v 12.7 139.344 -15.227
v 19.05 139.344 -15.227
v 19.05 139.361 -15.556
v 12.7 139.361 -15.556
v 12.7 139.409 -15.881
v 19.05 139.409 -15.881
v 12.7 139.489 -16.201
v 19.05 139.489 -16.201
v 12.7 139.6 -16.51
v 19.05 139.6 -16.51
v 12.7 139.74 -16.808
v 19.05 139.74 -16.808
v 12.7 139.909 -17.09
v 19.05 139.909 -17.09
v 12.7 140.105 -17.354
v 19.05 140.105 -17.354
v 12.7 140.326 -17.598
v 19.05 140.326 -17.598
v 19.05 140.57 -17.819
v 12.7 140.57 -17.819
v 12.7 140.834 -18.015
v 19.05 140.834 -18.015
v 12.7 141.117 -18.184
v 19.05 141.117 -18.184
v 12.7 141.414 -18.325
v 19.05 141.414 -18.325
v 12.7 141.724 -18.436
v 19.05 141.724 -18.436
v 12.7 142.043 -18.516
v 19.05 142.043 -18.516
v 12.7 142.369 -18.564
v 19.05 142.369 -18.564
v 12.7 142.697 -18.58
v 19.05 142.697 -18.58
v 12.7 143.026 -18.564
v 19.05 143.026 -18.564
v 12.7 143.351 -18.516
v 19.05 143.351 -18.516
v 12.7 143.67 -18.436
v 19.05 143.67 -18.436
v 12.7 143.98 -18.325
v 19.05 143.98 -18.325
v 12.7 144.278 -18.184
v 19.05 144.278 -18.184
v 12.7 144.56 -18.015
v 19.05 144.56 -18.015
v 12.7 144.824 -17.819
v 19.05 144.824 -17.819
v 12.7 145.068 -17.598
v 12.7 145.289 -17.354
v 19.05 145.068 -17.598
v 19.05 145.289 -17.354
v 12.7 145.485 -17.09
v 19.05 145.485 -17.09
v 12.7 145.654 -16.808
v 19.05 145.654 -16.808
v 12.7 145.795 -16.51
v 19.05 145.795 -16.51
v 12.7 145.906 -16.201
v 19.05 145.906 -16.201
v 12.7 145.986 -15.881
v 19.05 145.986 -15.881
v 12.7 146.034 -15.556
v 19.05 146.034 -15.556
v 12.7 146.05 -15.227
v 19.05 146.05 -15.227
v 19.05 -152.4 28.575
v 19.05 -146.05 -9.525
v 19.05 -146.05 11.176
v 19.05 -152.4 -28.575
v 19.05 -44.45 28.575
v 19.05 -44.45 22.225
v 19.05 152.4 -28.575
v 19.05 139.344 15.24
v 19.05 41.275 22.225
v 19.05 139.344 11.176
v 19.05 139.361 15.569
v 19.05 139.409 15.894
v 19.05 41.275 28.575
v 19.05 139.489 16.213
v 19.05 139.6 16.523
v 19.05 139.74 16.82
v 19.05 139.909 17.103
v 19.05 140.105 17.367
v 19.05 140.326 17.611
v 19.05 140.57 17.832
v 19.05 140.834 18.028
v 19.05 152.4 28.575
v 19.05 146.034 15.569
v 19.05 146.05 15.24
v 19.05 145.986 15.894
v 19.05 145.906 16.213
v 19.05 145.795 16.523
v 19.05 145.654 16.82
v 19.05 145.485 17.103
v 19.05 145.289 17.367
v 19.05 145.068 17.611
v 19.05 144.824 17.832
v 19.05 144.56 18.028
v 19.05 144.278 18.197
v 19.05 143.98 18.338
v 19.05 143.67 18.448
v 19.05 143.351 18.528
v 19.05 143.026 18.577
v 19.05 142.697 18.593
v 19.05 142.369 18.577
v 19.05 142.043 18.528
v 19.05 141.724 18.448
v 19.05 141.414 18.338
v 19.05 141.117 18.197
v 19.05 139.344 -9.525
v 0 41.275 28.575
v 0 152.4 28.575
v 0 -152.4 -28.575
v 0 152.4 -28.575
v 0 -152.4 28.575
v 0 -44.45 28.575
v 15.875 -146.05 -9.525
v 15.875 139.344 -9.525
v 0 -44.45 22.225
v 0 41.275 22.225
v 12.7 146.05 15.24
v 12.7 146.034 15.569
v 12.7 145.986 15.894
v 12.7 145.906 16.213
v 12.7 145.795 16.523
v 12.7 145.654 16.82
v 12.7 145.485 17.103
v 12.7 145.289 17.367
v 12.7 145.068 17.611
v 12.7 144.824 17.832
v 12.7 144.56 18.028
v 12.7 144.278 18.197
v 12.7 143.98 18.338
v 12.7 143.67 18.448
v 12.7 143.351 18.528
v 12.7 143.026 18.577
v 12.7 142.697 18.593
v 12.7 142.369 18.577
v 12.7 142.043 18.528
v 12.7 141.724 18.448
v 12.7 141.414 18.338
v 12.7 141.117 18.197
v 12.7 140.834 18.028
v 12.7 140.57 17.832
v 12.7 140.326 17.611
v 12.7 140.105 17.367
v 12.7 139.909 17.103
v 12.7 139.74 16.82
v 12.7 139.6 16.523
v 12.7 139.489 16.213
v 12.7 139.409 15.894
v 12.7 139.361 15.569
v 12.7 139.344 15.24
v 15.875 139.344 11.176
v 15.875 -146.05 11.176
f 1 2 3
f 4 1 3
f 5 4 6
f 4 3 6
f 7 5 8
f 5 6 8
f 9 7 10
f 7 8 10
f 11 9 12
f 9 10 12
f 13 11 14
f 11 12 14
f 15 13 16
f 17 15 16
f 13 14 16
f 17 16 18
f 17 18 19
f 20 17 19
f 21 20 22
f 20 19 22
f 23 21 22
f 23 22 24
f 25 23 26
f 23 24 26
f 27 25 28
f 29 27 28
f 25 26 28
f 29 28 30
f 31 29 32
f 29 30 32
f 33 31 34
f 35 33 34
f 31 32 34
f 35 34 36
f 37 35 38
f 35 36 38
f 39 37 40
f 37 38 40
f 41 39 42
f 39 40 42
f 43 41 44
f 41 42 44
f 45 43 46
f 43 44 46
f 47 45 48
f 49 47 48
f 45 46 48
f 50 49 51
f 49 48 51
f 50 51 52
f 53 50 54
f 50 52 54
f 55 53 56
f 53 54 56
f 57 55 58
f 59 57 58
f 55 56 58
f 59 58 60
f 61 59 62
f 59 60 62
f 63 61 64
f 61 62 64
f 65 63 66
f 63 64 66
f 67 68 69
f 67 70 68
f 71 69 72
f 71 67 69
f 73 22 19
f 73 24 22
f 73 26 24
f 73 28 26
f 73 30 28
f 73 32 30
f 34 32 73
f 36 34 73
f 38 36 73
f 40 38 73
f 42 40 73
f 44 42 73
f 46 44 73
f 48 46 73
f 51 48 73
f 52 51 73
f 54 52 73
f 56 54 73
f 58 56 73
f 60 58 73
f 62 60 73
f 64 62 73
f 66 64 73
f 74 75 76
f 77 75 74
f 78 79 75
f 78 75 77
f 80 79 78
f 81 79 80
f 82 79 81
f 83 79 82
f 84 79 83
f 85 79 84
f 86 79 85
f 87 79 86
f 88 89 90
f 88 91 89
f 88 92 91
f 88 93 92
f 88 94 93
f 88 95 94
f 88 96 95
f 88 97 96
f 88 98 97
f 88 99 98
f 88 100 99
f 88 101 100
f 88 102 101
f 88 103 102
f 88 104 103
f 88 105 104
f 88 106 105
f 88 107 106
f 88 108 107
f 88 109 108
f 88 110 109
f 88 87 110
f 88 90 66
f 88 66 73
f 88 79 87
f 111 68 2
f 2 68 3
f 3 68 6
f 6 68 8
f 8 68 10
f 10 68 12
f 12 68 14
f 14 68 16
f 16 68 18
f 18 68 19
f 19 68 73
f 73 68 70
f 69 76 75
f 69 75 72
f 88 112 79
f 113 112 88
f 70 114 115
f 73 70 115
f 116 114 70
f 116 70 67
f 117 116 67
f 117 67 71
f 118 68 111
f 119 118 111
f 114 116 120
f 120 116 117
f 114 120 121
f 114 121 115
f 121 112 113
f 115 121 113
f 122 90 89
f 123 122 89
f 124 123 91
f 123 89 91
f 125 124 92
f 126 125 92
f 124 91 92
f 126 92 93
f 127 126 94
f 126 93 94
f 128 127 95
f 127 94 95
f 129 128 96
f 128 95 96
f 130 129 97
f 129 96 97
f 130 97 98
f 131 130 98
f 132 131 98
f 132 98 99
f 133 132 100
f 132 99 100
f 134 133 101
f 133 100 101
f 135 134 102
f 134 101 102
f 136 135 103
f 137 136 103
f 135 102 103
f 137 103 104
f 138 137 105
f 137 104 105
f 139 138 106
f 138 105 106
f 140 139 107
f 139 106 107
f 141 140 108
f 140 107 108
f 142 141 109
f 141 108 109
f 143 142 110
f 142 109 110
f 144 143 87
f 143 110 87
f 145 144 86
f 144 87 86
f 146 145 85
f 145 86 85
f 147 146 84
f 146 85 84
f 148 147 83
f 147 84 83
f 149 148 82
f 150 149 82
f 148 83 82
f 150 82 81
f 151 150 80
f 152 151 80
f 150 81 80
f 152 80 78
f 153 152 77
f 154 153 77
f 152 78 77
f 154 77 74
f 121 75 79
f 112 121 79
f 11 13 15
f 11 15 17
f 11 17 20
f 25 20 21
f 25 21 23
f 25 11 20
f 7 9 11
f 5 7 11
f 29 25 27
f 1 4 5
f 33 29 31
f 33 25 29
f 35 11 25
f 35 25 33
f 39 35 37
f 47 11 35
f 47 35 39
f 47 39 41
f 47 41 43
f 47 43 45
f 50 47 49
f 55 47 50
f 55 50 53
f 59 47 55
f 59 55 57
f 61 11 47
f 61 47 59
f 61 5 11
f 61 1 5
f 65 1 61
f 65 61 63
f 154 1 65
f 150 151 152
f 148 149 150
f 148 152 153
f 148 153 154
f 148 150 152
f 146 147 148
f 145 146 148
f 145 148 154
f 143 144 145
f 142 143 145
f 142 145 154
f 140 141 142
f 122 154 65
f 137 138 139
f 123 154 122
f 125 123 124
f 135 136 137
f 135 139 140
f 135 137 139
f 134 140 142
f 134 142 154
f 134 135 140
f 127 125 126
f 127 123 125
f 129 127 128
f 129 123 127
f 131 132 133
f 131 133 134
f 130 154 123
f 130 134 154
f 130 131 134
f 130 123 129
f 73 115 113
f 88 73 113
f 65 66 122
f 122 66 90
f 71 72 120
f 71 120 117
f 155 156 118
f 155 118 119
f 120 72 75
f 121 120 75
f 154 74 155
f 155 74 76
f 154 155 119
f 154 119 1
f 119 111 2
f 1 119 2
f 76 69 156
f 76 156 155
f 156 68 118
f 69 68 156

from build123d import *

# Parameters (mm, degrees)
F0_W     = 304.8
F0_H     = 57.15
F1_DEPTH = 19.05
F3_DEPTH = 6.35
F4_W     = 285.3944
F4_H     = 20.701
F5_DEPTH = 3.175
F6_W     = 85.725
F6_H     = 6.35
F7_DEPTH = 19.05


with BuildPart() as f1:
    # F0 (on Right) → F1 (new body)
    with BuildSketch(Plane.YZ):
        Rectangle(F0_W, F0_H)
    extrude(amount=F1_DEPTH)

    # F2 (on face) → F3 (cut)
    with BuildSketch(Plane.YZ.offset(19.05)):
        with BuildLine():
            ThreePointArc((146.05, 15.24), (142.6972, 18.5928), (139.3444, 15.24))
            Line((139.3444, 15.24), (139.3444, -15.2273))
            ThreePointArc((139.3444, -15.2273), (142.6972, -18.5801), (146.05, -15.2273))
            Line((146.05, -15.2273), (146.05, 15.24))
        make_face()
    extrude(amount=-F3_DEPTH, mode=Mode.SUBTRACT)

    # F4 (on face) → F5 (cut)
    with BuildSketch(Plane.YZ.offset(19.05)):
        with Locations((-3.3528, 0.8255)):
            Rectangle(F4_W, F4_H)
    extrude(amount=-F5_DEPTH, mode=Mode.SUBTRACT)

    # F6 (on face) → F7 (cut, through all)
    with BuildSketch(Plane.YZ.offset(19.05)):
        with Locations((-1.5875, 25.4)):
            Rectangle(F6_W, F6_H)
    extrude(amount=-F7_DEPTH, mode=Mode.SUBTRACT)


solid = f1.part
